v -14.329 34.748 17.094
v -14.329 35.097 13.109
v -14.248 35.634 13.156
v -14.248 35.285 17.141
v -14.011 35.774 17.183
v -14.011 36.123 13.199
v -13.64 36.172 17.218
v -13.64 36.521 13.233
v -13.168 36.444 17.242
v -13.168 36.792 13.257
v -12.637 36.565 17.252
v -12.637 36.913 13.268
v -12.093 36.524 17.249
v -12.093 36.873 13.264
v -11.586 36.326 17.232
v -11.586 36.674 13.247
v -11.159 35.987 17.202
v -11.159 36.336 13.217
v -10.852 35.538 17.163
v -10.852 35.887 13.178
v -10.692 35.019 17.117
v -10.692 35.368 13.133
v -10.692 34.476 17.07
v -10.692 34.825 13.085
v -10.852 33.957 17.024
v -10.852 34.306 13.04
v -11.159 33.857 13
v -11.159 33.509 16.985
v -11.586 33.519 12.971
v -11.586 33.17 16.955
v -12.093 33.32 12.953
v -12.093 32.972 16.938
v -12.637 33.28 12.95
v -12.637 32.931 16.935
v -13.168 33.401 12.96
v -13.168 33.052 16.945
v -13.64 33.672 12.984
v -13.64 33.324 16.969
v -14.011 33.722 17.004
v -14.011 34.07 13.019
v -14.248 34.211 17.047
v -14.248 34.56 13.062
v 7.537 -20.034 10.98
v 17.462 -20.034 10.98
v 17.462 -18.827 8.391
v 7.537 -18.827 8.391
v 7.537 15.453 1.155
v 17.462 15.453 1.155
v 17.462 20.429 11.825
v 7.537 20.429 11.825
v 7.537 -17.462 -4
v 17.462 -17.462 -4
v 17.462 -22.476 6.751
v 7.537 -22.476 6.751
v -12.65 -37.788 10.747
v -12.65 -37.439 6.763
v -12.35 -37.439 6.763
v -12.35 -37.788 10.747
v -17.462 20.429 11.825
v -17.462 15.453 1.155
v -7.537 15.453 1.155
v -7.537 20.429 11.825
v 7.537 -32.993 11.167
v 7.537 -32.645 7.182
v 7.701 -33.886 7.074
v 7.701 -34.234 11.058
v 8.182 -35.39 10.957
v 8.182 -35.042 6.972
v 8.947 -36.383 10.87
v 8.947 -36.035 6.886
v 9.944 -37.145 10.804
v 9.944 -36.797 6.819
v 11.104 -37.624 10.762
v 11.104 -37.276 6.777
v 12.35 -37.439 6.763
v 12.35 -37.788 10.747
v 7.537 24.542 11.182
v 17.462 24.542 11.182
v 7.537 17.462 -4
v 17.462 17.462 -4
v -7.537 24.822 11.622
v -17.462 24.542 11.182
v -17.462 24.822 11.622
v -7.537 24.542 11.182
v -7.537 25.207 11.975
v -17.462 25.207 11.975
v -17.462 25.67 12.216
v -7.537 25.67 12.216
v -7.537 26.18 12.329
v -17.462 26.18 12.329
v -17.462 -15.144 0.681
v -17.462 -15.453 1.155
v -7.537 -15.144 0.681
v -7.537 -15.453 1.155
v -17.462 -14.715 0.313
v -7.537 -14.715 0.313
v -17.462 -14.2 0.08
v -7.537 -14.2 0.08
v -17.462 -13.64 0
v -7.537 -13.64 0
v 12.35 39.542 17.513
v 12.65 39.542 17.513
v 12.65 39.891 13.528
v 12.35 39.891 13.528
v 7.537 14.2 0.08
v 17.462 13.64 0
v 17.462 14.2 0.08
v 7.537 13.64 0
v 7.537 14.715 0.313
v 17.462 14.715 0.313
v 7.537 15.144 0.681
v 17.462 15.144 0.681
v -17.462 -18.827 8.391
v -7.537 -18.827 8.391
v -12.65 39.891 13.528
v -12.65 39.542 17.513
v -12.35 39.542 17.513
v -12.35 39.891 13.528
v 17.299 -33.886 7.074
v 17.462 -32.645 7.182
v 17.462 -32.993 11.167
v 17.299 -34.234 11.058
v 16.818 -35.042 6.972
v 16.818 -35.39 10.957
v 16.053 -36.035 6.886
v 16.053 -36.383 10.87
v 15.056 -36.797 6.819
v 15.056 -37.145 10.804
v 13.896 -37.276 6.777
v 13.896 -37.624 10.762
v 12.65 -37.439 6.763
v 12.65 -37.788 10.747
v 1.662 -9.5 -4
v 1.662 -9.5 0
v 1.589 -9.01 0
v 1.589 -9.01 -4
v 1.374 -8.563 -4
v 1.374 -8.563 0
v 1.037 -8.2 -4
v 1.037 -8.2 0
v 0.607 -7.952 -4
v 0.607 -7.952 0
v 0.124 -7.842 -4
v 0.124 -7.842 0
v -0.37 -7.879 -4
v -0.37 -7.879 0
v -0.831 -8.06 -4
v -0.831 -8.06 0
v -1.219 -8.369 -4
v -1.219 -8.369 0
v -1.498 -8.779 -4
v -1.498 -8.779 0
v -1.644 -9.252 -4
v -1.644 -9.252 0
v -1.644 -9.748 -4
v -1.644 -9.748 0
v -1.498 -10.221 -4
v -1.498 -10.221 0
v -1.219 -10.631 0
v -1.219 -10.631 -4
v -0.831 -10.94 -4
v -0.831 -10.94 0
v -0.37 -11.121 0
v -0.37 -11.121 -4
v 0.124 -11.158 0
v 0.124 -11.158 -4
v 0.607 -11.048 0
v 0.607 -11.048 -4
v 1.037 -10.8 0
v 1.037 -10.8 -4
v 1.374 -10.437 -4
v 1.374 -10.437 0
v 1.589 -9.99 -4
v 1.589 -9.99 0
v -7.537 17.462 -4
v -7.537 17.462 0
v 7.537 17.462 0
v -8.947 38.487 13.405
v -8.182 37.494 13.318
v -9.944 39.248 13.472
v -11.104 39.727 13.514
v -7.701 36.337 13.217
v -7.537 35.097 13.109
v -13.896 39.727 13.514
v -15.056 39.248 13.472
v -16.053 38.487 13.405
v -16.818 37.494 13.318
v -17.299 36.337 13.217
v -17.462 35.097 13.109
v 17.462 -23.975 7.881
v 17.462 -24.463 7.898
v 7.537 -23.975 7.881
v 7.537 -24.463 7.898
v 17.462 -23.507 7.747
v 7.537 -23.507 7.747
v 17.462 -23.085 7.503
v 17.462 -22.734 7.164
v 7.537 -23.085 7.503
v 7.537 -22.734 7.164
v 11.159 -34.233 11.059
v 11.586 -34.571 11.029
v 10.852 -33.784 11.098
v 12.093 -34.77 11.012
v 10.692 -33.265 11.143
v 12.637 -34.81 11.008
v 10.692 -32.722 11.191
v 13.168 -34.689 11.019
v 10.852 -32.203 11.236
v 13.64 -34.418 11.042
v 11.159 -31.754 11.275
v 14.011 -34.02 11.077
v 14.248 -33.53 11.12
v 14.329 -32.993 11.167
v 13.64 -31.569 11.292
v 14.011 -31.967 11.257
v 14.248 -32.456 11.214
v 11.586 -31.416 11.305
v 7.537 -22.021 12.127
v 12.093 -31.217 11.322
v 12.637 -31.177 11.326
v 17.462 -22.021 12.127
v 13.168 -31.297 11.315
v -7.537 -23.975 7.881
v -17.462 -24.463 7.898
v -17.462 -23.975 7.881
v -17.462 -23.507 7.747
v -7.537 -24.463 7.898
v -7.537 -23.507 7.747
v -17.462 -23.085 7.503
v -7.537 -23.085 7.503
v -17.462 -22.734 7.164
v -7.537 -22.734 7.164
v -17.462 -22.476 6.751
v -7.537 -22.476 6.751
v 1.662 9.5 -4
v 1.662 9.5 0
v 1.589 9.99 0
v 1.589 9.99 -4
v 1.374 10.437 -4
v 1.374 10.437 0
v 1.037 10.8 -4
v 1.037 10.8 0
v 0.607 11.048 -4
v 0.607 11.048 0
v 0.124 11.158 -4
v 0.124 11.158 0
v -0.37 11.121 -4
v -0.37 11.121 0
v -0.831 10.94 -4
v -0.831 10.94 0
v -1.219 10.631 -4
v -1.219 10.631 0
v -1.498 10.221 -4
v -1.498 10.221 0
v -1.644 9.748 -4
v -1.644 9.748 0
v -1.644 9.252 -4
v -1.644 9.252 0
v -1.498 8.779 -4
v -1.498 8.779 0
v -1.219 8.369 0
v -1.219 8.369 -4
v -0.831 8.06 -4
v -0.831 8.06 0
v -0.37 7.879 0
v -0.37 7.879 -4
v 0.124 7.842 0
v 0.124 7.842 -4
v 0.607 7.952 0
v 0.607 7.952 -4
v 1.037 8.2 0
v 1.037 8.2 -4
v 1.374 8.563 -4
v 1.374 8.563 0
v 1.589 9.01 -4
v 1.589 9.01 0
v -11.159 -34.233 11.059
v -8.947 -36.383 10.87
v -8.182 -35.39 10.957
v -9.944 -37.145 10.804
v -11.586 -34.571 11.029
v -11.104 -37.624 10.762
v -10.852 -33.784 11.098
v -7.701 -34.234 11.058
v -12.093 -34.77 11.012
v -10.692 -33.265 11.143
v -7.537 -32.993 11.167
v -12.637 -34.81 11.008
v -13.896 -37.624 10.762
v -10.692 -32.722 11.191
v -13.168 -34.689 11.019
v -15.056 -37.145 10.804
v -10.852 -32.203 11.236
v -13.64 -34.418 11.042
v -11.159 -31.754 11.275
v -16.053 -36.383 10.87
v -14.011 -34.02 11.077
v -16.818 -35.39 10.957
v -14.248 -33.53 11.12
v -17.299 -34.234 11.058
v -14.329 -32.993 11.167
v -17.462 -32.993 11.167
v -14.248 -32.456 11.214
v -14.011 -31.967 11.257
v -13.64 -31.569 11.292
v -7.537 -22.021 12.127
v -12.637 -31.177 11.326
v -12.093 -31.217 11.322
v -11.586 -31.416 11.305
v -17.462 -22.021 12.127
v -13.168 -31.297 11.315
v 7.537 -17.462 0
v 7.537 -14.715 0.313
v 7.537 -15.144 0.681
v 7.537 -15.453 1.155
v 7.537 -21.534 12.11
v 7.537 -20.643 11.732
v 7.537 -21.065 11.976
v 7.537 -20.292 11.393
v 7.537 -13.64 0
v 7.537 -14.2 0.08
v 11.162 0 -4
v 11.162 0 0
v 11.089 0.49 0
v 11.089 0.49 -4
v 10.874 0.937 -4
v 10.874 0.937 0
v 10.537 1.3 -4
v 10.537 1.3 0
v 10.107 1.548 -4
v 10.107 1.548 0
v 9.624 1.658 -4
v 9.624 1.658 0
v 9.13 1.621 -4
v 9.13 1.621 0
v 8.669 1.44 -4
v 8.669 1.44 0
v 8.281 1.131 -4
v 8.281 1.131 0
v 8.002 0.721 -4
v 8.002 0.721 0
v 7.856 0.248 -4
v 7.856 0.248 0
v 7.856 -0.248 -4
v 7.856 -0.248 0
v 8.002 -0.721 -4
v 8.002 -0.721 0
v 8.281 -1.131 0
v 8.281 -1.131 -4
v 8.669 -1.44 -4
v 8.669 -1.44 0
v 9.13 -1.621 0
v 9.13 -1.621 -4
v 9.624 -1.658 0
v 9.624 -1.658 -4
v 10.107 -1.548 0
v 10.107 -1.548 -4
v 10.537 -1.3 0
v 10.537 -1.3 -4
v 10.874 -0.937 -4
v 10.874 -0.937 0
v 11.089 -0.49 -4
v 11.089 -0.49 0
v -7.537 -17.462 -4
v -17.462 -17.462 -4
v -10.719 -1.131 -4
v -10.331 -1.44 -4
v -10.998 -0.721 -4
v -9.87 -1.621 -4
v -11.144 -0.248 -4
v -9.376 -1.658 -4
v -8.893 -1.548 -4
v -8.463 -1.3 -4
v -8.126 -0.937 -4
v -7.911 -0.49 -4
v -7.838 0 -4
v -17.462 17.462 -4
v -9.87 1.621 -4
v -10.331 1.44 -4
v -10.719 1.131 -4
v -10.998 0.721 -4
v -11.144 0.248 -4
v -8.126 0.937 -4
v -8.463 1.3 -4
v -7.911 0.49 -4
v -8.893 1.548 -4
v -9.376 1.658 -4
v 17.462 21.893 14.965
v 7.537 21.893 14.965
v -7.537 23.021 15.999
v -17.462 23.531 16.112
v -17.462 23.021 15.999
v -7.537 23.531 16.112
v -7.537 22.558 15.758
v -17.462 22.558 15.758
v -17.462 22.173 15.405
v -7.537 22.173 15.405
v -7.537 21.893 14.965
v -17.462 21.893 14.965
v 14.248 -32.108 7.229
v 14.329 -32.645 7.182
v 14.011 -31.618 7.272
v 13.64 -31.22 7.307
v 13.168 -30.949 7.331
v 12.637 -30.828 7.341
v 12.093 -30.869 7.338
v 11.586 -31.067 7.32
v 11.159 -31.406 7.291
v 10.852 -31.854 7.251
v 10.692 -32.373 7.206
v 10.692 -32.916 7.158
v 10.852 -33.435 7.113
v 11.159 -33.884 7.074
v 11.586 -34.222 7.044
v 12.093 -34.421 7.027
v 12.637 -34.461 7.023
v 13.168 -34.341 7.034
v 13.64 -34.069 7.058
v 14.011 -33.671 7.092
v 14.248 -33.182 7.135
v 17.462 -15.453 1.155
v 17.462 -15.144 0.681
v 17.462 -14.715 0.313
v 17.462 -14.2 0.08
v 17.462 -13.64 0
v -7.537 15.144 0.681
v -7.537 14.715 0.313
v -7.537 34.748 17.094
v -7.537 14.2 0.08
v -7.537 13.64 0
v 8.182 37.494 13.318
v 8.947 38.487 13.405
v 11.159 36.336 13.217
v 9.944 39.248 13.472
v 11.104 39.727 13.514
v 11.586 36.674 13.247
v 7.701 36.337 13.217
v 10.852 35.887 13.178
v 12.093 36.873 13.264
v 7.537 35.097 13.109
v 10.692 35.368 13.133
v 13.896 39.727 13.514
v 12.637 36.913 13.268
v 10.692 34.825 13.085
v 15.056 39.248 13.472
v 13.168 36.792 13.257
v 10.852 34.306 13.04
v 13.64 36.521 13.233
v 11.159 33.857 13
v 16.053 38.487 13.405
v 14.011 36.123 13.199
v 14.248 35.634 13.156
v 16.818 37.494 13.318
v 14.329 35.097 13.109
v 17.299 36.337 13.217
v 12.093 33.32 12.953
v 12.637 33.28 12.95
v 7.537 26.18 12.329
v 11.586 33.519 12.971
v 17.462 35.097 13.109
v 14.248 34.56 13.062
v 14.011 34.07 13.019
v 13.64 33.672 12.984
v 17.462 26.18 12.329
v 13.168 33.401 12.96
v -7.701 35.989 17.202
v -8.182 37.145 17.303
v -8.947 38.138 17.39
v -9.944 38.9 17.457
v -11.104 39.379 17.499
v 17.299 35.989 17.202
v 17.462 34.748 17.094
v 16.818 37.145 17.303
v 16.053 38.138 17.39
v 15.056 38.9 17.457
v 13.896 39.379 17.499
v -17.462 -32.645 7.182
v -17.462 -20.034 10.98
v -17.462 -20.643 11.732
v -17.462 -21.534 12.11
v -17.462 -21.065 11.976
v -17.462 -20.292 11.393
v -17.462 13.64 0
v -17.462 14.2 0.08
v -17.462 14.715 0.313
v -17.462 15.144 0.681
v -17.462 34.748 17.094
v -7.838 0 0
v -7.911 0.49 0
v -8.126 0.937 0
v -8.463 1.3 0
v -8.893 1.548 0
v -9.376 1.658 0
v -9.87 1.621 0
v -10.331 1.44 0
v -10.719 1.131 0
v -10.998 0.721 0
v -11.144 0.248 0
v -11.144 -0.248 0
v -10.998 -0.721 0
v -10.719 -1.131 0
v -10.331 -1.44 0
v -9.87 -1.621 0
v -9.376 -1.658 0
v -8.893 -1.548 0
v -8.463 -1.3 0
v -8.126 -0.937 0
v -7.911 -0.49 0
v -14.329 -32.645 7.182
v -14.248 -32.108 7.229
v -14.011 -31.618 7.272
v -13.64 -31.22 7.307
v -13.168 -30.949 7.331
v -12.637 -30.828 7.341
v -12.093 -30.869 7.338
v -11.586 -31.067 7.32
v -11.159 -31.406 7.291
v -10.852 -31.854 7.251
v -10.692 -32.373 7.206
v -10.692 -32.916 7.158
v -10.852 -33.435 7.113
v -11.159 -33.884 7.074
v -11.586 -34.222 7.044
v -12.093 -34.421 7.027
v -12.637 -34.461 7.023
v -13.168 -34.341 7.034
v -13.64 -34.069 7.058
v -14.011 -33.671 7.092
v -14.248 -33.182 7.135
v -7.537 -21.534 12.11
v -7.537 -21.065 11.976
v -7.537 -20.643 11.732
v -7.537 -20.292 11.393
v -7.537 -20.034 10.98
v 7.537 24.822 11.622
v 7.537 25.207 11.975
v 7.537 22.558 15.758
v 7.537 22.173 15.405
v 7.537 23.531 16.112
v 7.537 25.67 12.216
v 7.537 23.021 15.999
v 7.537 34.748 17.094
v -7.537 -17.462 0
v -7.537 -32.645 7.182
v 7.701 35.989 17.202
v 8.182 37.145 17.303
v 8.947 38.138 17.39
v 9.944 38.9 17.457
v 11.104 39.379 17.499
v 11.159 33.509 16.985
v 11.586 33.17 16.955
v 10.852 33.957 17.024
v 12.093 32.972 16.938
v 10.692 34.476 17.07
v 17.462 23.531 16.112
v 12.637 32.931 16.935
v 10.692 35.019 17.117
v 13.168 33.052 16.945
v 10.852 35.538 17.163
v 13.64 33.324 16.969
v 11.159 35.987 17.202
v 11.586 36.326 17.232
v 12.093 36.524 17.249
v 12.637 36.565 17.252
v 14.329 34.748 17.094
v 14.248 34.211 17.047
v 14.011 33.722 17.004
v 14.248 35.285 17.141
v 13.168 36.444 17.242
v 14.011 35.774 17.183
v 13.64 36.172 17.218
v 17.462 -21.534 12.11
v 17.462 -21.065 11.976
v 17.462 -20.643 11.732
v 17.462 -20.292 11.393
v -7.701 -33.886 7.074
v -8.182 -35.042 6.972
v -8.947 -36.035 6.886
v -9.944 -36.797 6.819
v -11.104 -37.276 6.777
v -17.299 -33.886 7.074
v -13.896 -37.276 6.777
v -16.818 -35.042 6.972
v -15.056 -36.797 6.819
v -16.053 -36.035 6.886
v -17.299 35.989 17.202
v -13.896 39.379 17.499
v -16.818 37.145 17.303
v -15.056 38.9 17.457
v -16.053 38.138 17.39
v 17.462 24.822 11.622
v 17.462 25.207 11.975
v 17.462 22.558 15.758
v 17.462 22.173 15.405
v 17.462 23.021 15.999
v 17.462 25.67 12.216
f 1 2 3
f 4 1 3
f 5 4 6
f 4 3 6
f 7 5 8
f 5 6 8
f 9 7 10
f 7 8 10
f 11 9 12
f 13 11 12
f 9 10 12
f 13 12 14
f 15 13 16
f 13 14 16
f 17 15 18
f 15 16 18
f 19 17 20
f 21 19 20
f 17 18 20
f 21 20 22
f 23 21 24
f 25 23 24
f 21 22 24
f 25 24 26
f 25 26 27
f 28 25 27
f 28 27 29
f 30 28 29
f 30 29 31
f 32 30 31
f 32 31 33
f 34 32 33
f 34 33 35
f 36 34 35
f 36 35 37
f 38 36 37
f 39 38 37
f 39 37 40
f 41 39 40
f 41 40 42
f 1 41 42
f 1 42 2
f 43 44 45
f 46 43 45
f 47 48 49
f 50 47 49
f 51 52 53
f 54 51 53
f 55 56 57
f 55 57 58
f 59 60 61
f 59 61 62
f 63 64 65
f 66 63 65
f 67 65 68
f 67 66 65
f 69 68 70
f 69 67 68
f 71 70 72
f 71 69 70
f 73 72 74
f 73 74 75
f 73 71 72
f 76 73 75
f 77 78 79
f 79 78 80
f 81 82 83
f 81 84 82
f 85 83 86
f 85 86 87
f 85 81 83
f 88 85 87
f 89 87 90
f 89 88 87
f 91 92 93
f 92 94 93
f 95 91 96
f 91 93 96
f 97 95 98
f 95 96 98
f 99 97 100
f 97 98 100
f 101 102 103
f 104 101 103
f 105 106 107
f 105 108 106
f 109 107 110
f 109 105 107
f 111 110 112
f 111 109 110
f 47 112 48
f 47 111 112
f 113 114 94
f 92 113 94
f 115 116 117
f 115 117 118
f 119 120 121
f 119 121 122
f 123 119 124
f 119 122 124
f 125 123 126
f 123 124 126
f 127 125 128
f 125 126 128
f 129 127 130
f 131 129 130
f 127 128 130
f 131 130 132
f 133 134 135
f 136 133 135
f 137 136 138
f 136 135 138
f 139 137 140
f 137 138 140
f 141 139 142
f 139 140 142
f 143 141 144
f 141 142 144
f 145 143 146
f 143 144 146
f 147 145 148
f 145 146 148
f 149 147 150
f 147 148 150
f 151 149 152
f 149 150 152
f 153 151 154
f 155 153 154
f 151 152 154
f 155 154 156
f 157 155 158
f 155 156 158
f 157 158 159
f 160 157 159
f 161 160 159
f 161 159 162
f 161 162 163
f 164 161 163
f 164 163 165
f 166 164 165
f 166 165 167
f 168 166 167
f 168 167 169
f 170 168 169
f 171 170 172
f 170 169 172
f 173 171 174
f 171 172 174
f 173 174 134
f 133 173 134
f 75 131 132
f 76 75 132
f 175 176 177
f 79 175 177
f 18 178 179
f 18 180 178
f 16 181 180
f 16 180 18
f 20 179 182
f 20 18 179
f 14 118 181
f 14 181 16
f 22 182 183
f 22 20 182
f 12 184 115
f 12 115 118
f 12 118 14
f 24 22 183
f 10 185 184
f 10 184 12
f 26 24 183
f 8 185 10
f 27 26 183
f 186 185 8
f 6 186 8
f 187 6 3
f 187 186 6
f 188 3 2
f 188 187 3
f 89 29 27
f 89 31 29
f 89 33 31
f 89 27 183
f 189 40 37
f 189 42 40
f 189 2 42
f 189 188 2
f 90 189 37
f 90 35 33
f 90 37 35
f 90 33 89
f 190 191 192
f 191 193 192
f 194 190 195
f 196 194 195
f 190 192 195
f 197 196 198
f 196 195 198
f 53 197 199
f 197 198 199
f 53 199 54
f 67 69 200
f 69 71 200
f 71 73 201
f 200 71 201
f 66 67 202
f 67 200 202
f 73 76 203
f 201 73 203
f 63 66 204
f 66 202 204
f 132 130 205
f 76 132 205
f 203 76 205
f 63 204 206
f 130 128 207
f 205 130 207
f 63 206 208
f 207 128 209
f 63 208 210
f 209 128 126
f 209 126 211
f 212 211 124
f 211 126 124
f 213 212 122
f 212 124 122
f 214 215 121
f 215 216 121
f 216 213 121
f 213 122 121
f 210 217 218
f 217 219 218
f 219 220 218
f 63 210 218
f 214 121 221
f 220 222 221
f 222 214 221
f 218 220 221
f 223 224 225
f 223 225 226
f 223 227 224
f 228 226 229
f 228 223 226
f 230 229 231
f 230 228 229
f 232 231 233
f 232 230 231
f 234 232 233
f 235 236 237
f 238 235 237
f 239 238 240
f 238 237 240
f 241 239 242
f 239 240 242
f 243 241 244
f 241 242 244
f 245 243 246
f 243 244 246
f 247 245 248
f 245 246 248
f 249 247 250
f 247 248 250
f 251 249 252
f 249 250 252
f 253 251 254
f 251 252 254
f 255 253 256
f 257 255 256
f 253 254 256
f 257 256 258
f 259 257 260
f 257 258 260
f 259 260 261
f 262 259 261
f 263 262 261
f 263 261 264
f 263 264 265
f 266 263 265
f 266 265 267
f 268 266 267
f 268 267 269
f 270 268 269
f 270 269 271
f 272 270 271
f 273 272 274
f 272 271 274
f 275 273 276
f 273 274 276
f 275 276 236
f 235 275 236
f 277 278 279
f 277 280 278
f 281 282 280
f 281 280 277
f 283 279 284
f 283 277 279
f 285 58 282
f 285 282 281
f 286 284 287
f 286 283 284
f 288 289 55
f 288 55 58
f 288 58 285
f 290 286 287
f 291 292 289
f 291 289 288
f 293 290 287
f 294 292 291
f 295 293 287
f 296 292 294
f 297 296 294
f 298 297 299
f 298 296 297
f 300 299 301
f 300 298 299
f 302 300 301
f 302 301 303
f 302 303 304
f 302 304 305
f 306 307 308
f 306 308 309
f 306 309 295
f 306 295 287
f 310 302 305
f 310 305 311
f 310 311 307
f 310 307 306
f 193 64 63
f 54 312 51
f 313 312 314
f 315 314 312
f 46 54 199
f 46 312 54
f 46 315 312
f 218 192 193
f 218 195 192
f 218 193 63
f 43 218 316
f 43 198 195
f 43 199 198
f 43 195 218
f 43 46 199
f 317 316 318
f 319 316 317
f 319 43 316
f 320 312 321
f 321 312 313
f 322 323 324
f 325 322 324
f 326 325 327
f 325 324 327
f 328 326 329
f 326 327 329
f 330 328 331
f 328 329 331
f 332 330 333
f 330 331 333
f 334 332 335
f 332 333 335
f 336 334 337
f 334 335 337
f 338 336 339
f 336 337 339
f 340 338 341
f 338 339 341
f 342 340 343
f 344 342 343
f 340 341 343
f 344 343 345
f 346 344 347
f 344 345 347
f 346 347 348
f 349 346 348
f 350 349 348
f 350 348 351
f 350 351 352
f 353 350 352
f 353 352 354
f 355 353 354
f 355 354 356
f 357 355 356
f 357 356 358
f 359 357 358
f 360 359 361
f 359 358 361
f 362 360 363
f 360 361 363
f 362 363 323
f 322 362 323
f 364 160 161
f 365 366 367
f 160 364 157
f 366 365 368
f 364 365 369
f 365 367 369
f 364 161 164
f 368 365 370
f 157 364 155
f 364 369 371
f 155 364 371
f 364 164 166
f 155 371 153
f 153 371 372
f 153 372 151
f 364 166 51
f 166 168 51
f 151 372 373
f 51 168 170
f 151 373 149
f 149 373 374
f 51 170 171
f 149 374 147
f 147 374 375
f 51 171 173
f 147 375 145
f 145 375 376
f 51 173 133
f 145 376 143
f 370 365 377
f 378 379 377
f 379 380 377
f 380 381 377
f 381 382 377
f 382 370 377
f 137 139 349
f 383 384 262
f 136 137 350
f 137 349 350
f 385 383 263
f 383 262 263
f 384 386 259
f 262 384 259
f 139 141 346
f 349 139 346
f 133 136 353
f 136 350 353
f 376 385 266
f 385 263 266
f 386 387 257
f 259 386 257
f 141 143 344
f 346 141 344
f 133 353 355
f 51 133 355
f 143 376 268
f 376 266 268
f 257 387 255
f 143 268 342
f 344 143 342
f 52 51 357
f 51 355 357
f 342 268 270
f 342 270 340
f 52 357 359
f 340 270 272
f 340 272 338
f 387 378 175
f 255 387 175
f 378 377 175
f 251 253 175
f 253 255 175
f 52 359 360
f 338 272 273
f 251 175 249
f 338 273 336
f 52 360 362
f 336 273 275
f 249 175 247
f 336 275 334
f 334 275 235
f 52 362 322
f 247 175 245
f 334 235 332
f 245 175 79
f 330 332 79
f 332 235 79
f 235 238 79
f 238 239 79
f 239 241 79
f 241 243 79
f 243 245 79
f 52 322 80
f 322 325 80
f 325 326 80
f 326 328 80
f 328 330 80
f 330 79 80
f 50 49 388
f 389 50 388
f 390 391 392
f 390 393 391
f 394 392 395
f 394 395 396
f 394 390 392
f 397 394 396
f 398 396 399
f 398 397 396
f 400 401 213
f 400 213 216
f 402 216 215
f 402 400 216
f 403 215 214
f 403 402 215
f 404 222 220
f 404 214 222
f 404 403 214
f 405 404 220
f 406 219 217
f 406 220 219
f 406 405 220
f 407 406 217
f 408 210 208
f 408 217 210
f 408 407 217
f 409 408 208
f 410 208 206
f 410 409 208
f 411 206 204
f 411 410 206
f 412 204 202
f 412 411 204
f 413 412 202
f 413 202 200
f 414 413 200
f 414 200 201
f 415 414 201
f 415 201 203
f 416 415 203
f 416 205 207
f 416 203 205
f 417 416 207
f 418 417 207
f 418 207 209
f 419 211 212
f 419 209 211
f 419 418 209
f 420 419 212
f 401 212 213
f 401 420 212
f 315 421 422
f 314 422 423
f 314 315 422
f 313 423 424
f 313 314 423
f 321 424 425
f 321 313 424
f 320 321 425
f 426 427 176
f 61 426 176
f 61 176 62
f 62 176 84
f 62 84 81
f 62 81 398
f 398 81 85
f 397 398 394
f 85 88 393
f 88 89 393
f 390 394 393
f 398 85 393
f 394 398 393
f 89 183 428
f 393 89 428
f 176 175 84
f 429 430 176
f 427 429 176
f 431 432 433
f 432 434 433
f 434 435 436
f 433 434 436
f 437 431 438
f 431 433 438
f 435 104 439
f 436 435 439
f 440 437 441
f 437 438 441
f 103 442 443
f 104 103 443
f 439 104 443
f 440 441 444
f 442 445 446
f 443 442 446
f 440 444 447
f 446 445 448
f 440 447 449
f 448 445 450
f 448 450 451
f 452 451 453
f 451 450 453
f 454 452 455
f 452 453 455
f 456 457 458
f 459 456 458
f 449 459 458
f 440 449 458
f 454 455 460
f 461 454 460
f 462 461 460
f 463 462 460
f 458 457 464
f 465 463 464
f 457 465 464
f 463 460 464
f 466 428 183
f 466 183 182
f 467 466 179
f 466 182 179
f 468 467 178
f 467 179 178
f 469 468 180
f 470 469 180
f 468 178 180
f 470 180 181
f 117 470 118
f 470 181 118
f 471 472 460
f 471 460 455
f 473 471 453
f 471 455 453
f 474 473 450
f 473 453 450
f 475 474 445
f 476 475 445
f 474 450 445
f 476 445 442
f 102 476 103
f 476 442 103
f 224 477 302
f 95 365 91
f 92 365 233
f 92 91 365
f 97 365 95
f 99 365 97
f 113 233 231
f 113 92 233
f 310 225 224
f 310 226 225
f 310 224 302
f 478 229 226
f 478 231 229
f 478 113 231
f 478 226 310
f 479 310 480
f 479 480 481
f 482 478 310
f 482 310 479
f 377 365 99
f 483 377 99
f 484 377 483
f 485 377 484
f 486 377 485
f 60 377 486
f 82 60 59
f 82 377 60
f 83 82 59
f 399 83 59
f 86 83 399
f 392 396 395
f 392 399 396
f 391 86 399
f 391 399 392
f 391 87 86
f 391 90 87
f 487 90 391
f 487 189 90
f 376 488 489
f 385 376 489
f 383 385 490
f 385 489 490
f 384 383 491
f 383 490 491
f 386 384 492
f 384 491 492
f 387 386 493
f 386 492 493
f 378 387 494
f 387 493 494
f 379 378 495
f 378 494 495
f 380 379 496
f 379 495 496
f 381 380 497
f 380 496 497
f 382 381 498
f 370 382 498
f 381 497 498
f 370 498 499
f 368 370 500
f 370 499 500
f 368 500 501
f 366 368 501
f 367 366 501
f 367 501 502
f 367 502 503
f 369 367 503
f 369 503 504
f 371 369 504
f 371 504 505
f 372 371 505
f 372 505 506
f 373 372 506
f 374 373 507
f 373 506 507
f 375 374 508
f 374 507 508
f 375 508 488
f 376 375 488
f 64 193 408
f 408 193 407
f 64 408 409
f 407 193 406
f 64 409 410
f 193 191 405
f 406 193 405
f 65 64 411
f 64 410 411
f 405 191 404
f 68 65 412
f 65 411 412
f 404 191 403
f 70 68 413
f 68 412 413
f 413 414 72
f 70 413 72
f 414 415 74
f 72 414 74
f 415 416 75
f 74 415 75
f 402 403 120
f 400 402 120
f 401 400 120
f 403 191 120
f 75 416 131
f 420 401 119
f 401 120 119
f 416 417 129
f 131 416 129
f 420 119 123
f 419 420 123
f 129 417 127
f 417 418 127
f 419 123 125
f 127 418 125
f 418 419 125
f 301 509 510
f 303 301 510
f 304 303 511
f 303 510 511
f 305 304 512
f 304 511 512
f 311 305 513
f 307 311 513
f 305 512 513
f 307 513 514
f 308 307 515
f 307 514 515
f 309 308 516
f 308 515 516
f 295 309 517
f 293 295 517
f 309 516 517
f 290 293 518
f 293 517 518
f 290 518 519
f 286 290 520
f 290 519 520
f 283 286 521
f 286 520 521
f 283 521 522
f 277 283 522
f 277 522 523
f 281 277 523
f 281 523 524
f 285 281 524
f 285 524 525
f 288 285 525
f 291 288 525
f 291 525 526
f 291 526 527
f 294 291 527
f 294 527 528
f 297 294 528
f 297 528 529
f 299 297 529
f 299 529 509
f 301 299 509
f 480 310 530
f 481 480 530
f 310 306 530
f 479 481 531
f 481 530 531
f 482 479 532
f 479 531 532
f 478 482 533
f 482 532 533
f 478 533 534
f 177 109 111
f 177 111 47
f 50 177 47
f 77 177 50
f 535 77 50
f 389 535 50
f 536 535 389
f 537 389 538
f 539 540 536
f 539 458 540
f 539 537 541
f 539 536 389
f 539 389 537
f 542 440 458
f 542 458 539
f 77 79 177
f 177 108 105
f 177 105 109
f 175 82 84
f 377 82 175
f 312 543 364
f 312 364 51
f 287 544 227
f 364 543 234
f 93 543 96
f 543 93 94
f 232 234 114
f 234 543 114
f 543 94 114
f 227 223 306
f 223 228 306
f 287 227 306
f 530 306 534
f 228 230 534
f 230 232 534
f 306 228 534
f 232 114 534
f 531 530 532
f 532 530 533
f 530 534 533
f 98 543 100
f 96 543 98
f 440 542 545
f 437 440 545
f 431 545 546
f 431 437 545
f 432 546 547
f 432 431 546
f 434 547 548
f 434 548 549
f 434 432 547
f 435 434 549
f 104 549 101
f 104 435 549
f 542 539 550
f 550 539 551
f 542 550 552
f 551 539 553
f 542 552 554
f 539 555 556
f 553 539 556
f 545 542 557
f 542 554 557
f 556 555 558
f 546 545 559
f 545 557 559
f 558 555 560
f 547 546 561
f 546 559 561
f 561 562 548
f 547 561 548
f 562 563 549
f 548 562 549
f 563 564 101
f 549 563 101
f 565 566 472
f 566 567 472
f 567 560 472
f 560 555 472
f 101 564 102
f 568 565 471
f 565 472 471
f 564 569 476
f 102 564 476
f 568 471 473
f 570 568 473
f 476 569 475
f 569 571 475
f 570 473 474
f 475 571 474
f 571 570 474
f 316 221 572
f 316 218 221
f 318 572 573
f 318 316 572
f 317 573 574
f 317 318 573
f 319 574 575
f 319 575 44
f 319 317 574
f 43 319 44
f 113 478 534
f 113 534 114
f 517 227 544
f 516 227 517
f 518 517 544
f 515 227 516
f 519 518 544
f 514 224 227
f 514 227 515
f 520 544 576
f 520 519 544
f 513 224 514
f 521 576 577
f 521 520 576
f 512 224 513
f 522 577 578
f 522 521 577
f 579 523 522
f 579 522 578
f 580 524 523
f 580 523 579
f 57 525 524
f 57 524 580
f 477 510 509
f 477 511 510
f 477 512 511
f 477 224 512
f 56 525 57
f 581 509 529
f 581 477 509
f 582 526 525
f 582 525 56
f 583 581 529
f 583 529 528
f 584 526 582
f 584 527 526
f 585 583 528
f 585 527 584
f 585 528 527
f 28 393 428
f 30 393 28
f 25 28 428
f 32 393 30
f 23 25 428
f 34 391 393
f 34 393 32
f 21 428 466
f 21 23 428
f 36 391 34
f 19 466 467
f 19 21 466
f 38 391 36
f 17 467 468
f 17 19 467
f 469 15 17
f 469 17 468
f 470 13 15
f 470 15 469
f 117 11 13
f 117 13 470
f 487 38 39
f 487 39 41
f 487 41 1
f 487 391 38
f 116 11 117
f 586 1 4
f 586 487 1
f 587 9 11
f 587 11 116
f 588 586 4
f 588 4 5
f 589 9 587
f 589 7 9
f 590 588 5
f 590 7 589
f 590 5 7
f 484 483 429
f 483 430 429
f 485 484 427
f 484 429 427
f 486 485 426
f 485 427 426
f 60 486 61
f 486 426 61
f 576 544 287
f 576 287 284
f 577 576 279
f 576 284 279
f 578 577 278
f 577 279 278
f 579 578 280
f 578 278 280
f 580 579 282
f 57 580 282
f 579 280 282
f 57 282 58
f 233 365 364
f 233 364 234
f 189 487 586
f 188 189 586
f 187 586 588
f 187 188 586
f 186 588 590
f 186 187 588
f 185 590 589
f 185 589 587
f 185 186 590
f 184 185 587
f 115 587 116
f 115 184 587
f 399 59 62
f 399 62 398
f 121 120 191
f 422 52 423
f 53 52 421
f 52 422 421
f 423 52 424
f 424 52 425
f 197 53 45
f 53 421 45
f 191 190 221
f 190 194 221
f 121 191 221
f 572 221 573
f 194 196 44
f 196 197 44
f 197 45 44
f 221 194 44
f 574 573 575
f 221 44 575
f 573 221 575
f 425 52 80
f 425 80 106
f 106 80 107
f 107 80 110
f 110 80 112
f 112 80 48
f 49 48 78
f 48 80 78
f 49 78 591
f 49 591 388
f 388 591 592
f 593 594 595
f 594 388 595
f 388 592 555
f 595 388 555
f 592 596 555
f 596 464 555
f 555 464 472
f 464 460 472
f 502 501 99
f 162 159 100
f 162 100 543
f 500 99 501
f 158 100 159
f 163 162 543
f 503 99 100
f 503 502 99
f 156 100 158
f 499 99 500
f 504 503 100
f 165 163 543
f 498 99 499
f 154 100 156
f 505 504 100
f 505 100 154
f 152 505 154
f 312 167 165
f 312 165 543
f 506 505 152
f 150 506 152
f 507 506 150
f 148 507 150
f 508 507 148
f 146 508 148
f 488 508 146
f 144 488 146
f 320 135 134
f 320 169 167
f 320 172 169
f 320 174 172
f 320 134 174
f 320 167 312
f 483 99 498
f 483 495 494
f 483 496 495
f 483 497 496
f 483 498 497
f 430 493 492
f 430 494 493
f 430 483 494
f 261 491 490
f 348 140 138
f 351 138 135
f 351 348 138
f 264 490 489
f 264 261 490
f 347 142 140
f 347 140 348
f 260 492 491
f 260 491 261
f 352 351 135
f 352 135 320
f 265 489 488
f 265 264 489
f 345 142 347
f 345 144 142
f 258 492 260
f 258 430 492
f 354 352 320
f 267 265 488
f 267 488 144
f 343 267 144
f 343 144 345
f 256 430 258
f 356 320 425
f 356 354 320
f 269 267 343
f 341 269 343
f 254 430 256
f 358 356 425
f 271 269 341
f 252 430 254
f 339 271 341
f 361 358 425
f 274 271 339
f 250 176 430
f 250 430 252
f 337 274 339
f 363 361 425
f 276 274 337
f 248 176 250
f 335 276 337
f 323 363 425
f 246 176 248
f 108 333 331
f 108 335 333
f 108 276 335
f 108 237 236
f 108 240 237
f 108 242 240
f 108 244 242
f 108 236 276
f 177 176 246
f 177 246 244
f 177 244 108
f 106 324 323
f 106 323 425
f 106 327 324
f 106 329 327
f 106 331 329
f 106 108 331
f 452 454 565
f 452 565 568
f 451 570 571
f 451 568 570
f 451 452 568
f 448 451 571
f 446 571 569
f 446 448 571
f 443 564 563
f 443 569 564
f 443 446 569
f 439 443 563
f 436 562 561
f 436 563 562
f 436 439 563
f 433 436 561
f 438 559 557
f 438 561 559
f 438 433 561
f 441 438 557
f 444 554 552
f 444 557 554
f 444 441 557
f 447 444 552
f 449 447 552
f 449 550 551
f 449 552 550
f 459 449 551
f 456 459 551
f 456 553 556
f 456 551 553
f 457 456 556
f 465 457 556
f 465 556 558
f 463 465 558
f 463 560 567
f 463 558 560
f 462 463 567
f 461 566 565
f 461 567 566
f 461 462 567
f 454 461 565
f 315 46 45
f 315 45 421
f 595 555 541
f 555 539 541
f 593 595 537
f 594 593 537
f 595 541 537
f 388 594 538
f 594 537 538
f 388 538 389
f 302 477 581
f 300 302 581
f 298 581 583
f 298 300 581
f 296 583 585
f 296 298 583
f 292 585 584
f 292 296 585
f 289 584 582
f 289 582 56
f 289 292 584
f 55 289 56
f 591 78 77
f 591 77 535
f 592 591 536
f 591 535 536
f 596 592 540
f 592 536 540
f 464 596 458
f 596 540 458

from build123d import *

# Parameters (mm, degrees)
SKETCH1_W             = 34.925
SKETCH1_H             = 34.925
SKETCH1_R             = 1.6625
BOSS_EXTRUDE4_DEPTH   = 4
BOSS_EXTRUDE7_DEPTH   = 9.925
F_6_CLEARANCE_HOLE1_D = 3.6576
FILLET1_R             = 4.8125
FILLET2_R             = 2
FILLET1_OF_MIRROR1_R  = 4.8125
FILLET2_OF_MIRROR1_R  = 2


with BuildPart() as part:
    # Sketch1 → Boss-Extrude4 (new body)
    with BuildSketch(Plane.XY):
        Rectangle(SKETCH1_W, SKETCH1_H)
        with Locations((0, 9.5)):
            Circle(SKETCH1_R, mode=Mode.SUBTRACT)
        with Locations((9.5, 0)):
            Circle(SKETCH1_R, mode=Mode.SUBTRACT)
        with Locations((-9.5, 0)):
            Circle(SKETCH1_R, mode=Mode.SUBTRACT)
        with Locations((0, -9.5)):
            Circle(SKETCH1_R, mode=Mode.SUBTRACT)
    extrude(amount=-BOSS_EXTRUDE4_DEPTH)

    # Sketch7 → Boss-Extrude7 (add)
    with BuildSketch(Plane.ZY.offset(17.4625)):
        Polygon((0, 14.914218957), (11.825462524, 20.428522693), (16.011518882, 22.38051283), (17.512960324, 39.542067038), (13.528181531, 39.890690009), (12.228017656, 25.02974891), (-4, 17.4625), align=None)
        Polygon((8.02005001, -23.067541371), (6.762717001, -37.43892343), (10.747495793, -37.787546401), (12.248937235, -20.625992194), (8.391046827, -18.827028352), (0, -14.914218957), (-4, -17.4625), align=None)
    boss_extrude7 = extrude(amount=-BOSS_EXTRUDE7_DEPTH)

    # #6 Clearance Hole1 (through all)
    with Locations(Plane(origin=(0, -1.220180398, 13.946725773), x_dir=(1, 0, 0), z_dir=(0, -0.08715574274765159, 0.9961946980917462))):
        with Locations((-12.5, 36.1054526), (-12.5, -31.8945474)):
            f_6_clearance_hole1 = Hole(F_6_CLEARANCE_HOLE1_D / 2)

    # Fillet1
    fillet1_edges = [part.edges().sort_by_distance(p)[0] for p in [
        (-7.5375, -37.613234916, 8.755106397),
        (-17.4625, -37.613234916, 8.755106397),
        (-17.4625, 39.716378524, 15.520570928),
        (-7.5375, 39.716378524, 15.520570928),
    ]]
    fillet(fillet1_edges, radius=FILLET1_R)

    # Fillet2
    fillet2_edges = [part.edges().sort_by_distance(p)[0] for p in [
        (-12.5, -20.625992194, 12.248937235),
        (-12.5, -23.067541371, 8.02005001),
        (-12.5, -14.914218957, 0),
        (-12.5, 22.38051283, 16.011518882),
        (-12.5, 14.914218957, 0),
        (-12.5, 25.02974891, 12.228017656),
    ]]
    fillet(fillet2_edges, radius=FILLET2_R)

    # Mirror1: Boss-Extrude7, #6 Clearance Hole1 across plane
    add(boss_extrude7.mirror(Plane(origin=(0, 0, 0), x_dir=(0, 0, 1), z_dir=(1, 0, 0))))
    add(f_6_clearance_hole1.mirror(Plane(origin=(0, 0, 0), x_dir=(0, 0, 1), z_dir=(1, 0, 0))), mode=Mode.SUBTRACT)

    # Fillet1 of Mirror1
    fillet1_of_mirror1_edges = [part.edges().sort_by_distance(p)[0] for p in [
        (7.5375, -37.613234916, 8.755106397),
        (17.4625, -37.613234916, 8.755106397),
        (17.4625, 39.716378524, 15.520570928),
        (7.5375, 39.716378524, 15.520570928),
    ]]
    fillet(fillet1_of_mirror1_edges, radius=FILLET1_OF_MIRROR1_R)

    # Fillet2 of Mirror1
    fillet2_of_mirror1_edges = [part.edges().sort_by_distance(p)[0] for p in [
        (12.5, -20.625992194, 12.248937235),
        (12.5, -23.067541371, 8.02005001),
        (12.5, -14.914218957, 0),
        (12.5, 22.38051283, 16.011518882),
        (12.5, 14.914218957, 0),
        (12.5, 25.02974891, 12.228017656),
    ]]
    fillet(fillet2_of_mirror1_edges, radius=FILLET2_OF_MIRROR1_R)


solid = part.part
